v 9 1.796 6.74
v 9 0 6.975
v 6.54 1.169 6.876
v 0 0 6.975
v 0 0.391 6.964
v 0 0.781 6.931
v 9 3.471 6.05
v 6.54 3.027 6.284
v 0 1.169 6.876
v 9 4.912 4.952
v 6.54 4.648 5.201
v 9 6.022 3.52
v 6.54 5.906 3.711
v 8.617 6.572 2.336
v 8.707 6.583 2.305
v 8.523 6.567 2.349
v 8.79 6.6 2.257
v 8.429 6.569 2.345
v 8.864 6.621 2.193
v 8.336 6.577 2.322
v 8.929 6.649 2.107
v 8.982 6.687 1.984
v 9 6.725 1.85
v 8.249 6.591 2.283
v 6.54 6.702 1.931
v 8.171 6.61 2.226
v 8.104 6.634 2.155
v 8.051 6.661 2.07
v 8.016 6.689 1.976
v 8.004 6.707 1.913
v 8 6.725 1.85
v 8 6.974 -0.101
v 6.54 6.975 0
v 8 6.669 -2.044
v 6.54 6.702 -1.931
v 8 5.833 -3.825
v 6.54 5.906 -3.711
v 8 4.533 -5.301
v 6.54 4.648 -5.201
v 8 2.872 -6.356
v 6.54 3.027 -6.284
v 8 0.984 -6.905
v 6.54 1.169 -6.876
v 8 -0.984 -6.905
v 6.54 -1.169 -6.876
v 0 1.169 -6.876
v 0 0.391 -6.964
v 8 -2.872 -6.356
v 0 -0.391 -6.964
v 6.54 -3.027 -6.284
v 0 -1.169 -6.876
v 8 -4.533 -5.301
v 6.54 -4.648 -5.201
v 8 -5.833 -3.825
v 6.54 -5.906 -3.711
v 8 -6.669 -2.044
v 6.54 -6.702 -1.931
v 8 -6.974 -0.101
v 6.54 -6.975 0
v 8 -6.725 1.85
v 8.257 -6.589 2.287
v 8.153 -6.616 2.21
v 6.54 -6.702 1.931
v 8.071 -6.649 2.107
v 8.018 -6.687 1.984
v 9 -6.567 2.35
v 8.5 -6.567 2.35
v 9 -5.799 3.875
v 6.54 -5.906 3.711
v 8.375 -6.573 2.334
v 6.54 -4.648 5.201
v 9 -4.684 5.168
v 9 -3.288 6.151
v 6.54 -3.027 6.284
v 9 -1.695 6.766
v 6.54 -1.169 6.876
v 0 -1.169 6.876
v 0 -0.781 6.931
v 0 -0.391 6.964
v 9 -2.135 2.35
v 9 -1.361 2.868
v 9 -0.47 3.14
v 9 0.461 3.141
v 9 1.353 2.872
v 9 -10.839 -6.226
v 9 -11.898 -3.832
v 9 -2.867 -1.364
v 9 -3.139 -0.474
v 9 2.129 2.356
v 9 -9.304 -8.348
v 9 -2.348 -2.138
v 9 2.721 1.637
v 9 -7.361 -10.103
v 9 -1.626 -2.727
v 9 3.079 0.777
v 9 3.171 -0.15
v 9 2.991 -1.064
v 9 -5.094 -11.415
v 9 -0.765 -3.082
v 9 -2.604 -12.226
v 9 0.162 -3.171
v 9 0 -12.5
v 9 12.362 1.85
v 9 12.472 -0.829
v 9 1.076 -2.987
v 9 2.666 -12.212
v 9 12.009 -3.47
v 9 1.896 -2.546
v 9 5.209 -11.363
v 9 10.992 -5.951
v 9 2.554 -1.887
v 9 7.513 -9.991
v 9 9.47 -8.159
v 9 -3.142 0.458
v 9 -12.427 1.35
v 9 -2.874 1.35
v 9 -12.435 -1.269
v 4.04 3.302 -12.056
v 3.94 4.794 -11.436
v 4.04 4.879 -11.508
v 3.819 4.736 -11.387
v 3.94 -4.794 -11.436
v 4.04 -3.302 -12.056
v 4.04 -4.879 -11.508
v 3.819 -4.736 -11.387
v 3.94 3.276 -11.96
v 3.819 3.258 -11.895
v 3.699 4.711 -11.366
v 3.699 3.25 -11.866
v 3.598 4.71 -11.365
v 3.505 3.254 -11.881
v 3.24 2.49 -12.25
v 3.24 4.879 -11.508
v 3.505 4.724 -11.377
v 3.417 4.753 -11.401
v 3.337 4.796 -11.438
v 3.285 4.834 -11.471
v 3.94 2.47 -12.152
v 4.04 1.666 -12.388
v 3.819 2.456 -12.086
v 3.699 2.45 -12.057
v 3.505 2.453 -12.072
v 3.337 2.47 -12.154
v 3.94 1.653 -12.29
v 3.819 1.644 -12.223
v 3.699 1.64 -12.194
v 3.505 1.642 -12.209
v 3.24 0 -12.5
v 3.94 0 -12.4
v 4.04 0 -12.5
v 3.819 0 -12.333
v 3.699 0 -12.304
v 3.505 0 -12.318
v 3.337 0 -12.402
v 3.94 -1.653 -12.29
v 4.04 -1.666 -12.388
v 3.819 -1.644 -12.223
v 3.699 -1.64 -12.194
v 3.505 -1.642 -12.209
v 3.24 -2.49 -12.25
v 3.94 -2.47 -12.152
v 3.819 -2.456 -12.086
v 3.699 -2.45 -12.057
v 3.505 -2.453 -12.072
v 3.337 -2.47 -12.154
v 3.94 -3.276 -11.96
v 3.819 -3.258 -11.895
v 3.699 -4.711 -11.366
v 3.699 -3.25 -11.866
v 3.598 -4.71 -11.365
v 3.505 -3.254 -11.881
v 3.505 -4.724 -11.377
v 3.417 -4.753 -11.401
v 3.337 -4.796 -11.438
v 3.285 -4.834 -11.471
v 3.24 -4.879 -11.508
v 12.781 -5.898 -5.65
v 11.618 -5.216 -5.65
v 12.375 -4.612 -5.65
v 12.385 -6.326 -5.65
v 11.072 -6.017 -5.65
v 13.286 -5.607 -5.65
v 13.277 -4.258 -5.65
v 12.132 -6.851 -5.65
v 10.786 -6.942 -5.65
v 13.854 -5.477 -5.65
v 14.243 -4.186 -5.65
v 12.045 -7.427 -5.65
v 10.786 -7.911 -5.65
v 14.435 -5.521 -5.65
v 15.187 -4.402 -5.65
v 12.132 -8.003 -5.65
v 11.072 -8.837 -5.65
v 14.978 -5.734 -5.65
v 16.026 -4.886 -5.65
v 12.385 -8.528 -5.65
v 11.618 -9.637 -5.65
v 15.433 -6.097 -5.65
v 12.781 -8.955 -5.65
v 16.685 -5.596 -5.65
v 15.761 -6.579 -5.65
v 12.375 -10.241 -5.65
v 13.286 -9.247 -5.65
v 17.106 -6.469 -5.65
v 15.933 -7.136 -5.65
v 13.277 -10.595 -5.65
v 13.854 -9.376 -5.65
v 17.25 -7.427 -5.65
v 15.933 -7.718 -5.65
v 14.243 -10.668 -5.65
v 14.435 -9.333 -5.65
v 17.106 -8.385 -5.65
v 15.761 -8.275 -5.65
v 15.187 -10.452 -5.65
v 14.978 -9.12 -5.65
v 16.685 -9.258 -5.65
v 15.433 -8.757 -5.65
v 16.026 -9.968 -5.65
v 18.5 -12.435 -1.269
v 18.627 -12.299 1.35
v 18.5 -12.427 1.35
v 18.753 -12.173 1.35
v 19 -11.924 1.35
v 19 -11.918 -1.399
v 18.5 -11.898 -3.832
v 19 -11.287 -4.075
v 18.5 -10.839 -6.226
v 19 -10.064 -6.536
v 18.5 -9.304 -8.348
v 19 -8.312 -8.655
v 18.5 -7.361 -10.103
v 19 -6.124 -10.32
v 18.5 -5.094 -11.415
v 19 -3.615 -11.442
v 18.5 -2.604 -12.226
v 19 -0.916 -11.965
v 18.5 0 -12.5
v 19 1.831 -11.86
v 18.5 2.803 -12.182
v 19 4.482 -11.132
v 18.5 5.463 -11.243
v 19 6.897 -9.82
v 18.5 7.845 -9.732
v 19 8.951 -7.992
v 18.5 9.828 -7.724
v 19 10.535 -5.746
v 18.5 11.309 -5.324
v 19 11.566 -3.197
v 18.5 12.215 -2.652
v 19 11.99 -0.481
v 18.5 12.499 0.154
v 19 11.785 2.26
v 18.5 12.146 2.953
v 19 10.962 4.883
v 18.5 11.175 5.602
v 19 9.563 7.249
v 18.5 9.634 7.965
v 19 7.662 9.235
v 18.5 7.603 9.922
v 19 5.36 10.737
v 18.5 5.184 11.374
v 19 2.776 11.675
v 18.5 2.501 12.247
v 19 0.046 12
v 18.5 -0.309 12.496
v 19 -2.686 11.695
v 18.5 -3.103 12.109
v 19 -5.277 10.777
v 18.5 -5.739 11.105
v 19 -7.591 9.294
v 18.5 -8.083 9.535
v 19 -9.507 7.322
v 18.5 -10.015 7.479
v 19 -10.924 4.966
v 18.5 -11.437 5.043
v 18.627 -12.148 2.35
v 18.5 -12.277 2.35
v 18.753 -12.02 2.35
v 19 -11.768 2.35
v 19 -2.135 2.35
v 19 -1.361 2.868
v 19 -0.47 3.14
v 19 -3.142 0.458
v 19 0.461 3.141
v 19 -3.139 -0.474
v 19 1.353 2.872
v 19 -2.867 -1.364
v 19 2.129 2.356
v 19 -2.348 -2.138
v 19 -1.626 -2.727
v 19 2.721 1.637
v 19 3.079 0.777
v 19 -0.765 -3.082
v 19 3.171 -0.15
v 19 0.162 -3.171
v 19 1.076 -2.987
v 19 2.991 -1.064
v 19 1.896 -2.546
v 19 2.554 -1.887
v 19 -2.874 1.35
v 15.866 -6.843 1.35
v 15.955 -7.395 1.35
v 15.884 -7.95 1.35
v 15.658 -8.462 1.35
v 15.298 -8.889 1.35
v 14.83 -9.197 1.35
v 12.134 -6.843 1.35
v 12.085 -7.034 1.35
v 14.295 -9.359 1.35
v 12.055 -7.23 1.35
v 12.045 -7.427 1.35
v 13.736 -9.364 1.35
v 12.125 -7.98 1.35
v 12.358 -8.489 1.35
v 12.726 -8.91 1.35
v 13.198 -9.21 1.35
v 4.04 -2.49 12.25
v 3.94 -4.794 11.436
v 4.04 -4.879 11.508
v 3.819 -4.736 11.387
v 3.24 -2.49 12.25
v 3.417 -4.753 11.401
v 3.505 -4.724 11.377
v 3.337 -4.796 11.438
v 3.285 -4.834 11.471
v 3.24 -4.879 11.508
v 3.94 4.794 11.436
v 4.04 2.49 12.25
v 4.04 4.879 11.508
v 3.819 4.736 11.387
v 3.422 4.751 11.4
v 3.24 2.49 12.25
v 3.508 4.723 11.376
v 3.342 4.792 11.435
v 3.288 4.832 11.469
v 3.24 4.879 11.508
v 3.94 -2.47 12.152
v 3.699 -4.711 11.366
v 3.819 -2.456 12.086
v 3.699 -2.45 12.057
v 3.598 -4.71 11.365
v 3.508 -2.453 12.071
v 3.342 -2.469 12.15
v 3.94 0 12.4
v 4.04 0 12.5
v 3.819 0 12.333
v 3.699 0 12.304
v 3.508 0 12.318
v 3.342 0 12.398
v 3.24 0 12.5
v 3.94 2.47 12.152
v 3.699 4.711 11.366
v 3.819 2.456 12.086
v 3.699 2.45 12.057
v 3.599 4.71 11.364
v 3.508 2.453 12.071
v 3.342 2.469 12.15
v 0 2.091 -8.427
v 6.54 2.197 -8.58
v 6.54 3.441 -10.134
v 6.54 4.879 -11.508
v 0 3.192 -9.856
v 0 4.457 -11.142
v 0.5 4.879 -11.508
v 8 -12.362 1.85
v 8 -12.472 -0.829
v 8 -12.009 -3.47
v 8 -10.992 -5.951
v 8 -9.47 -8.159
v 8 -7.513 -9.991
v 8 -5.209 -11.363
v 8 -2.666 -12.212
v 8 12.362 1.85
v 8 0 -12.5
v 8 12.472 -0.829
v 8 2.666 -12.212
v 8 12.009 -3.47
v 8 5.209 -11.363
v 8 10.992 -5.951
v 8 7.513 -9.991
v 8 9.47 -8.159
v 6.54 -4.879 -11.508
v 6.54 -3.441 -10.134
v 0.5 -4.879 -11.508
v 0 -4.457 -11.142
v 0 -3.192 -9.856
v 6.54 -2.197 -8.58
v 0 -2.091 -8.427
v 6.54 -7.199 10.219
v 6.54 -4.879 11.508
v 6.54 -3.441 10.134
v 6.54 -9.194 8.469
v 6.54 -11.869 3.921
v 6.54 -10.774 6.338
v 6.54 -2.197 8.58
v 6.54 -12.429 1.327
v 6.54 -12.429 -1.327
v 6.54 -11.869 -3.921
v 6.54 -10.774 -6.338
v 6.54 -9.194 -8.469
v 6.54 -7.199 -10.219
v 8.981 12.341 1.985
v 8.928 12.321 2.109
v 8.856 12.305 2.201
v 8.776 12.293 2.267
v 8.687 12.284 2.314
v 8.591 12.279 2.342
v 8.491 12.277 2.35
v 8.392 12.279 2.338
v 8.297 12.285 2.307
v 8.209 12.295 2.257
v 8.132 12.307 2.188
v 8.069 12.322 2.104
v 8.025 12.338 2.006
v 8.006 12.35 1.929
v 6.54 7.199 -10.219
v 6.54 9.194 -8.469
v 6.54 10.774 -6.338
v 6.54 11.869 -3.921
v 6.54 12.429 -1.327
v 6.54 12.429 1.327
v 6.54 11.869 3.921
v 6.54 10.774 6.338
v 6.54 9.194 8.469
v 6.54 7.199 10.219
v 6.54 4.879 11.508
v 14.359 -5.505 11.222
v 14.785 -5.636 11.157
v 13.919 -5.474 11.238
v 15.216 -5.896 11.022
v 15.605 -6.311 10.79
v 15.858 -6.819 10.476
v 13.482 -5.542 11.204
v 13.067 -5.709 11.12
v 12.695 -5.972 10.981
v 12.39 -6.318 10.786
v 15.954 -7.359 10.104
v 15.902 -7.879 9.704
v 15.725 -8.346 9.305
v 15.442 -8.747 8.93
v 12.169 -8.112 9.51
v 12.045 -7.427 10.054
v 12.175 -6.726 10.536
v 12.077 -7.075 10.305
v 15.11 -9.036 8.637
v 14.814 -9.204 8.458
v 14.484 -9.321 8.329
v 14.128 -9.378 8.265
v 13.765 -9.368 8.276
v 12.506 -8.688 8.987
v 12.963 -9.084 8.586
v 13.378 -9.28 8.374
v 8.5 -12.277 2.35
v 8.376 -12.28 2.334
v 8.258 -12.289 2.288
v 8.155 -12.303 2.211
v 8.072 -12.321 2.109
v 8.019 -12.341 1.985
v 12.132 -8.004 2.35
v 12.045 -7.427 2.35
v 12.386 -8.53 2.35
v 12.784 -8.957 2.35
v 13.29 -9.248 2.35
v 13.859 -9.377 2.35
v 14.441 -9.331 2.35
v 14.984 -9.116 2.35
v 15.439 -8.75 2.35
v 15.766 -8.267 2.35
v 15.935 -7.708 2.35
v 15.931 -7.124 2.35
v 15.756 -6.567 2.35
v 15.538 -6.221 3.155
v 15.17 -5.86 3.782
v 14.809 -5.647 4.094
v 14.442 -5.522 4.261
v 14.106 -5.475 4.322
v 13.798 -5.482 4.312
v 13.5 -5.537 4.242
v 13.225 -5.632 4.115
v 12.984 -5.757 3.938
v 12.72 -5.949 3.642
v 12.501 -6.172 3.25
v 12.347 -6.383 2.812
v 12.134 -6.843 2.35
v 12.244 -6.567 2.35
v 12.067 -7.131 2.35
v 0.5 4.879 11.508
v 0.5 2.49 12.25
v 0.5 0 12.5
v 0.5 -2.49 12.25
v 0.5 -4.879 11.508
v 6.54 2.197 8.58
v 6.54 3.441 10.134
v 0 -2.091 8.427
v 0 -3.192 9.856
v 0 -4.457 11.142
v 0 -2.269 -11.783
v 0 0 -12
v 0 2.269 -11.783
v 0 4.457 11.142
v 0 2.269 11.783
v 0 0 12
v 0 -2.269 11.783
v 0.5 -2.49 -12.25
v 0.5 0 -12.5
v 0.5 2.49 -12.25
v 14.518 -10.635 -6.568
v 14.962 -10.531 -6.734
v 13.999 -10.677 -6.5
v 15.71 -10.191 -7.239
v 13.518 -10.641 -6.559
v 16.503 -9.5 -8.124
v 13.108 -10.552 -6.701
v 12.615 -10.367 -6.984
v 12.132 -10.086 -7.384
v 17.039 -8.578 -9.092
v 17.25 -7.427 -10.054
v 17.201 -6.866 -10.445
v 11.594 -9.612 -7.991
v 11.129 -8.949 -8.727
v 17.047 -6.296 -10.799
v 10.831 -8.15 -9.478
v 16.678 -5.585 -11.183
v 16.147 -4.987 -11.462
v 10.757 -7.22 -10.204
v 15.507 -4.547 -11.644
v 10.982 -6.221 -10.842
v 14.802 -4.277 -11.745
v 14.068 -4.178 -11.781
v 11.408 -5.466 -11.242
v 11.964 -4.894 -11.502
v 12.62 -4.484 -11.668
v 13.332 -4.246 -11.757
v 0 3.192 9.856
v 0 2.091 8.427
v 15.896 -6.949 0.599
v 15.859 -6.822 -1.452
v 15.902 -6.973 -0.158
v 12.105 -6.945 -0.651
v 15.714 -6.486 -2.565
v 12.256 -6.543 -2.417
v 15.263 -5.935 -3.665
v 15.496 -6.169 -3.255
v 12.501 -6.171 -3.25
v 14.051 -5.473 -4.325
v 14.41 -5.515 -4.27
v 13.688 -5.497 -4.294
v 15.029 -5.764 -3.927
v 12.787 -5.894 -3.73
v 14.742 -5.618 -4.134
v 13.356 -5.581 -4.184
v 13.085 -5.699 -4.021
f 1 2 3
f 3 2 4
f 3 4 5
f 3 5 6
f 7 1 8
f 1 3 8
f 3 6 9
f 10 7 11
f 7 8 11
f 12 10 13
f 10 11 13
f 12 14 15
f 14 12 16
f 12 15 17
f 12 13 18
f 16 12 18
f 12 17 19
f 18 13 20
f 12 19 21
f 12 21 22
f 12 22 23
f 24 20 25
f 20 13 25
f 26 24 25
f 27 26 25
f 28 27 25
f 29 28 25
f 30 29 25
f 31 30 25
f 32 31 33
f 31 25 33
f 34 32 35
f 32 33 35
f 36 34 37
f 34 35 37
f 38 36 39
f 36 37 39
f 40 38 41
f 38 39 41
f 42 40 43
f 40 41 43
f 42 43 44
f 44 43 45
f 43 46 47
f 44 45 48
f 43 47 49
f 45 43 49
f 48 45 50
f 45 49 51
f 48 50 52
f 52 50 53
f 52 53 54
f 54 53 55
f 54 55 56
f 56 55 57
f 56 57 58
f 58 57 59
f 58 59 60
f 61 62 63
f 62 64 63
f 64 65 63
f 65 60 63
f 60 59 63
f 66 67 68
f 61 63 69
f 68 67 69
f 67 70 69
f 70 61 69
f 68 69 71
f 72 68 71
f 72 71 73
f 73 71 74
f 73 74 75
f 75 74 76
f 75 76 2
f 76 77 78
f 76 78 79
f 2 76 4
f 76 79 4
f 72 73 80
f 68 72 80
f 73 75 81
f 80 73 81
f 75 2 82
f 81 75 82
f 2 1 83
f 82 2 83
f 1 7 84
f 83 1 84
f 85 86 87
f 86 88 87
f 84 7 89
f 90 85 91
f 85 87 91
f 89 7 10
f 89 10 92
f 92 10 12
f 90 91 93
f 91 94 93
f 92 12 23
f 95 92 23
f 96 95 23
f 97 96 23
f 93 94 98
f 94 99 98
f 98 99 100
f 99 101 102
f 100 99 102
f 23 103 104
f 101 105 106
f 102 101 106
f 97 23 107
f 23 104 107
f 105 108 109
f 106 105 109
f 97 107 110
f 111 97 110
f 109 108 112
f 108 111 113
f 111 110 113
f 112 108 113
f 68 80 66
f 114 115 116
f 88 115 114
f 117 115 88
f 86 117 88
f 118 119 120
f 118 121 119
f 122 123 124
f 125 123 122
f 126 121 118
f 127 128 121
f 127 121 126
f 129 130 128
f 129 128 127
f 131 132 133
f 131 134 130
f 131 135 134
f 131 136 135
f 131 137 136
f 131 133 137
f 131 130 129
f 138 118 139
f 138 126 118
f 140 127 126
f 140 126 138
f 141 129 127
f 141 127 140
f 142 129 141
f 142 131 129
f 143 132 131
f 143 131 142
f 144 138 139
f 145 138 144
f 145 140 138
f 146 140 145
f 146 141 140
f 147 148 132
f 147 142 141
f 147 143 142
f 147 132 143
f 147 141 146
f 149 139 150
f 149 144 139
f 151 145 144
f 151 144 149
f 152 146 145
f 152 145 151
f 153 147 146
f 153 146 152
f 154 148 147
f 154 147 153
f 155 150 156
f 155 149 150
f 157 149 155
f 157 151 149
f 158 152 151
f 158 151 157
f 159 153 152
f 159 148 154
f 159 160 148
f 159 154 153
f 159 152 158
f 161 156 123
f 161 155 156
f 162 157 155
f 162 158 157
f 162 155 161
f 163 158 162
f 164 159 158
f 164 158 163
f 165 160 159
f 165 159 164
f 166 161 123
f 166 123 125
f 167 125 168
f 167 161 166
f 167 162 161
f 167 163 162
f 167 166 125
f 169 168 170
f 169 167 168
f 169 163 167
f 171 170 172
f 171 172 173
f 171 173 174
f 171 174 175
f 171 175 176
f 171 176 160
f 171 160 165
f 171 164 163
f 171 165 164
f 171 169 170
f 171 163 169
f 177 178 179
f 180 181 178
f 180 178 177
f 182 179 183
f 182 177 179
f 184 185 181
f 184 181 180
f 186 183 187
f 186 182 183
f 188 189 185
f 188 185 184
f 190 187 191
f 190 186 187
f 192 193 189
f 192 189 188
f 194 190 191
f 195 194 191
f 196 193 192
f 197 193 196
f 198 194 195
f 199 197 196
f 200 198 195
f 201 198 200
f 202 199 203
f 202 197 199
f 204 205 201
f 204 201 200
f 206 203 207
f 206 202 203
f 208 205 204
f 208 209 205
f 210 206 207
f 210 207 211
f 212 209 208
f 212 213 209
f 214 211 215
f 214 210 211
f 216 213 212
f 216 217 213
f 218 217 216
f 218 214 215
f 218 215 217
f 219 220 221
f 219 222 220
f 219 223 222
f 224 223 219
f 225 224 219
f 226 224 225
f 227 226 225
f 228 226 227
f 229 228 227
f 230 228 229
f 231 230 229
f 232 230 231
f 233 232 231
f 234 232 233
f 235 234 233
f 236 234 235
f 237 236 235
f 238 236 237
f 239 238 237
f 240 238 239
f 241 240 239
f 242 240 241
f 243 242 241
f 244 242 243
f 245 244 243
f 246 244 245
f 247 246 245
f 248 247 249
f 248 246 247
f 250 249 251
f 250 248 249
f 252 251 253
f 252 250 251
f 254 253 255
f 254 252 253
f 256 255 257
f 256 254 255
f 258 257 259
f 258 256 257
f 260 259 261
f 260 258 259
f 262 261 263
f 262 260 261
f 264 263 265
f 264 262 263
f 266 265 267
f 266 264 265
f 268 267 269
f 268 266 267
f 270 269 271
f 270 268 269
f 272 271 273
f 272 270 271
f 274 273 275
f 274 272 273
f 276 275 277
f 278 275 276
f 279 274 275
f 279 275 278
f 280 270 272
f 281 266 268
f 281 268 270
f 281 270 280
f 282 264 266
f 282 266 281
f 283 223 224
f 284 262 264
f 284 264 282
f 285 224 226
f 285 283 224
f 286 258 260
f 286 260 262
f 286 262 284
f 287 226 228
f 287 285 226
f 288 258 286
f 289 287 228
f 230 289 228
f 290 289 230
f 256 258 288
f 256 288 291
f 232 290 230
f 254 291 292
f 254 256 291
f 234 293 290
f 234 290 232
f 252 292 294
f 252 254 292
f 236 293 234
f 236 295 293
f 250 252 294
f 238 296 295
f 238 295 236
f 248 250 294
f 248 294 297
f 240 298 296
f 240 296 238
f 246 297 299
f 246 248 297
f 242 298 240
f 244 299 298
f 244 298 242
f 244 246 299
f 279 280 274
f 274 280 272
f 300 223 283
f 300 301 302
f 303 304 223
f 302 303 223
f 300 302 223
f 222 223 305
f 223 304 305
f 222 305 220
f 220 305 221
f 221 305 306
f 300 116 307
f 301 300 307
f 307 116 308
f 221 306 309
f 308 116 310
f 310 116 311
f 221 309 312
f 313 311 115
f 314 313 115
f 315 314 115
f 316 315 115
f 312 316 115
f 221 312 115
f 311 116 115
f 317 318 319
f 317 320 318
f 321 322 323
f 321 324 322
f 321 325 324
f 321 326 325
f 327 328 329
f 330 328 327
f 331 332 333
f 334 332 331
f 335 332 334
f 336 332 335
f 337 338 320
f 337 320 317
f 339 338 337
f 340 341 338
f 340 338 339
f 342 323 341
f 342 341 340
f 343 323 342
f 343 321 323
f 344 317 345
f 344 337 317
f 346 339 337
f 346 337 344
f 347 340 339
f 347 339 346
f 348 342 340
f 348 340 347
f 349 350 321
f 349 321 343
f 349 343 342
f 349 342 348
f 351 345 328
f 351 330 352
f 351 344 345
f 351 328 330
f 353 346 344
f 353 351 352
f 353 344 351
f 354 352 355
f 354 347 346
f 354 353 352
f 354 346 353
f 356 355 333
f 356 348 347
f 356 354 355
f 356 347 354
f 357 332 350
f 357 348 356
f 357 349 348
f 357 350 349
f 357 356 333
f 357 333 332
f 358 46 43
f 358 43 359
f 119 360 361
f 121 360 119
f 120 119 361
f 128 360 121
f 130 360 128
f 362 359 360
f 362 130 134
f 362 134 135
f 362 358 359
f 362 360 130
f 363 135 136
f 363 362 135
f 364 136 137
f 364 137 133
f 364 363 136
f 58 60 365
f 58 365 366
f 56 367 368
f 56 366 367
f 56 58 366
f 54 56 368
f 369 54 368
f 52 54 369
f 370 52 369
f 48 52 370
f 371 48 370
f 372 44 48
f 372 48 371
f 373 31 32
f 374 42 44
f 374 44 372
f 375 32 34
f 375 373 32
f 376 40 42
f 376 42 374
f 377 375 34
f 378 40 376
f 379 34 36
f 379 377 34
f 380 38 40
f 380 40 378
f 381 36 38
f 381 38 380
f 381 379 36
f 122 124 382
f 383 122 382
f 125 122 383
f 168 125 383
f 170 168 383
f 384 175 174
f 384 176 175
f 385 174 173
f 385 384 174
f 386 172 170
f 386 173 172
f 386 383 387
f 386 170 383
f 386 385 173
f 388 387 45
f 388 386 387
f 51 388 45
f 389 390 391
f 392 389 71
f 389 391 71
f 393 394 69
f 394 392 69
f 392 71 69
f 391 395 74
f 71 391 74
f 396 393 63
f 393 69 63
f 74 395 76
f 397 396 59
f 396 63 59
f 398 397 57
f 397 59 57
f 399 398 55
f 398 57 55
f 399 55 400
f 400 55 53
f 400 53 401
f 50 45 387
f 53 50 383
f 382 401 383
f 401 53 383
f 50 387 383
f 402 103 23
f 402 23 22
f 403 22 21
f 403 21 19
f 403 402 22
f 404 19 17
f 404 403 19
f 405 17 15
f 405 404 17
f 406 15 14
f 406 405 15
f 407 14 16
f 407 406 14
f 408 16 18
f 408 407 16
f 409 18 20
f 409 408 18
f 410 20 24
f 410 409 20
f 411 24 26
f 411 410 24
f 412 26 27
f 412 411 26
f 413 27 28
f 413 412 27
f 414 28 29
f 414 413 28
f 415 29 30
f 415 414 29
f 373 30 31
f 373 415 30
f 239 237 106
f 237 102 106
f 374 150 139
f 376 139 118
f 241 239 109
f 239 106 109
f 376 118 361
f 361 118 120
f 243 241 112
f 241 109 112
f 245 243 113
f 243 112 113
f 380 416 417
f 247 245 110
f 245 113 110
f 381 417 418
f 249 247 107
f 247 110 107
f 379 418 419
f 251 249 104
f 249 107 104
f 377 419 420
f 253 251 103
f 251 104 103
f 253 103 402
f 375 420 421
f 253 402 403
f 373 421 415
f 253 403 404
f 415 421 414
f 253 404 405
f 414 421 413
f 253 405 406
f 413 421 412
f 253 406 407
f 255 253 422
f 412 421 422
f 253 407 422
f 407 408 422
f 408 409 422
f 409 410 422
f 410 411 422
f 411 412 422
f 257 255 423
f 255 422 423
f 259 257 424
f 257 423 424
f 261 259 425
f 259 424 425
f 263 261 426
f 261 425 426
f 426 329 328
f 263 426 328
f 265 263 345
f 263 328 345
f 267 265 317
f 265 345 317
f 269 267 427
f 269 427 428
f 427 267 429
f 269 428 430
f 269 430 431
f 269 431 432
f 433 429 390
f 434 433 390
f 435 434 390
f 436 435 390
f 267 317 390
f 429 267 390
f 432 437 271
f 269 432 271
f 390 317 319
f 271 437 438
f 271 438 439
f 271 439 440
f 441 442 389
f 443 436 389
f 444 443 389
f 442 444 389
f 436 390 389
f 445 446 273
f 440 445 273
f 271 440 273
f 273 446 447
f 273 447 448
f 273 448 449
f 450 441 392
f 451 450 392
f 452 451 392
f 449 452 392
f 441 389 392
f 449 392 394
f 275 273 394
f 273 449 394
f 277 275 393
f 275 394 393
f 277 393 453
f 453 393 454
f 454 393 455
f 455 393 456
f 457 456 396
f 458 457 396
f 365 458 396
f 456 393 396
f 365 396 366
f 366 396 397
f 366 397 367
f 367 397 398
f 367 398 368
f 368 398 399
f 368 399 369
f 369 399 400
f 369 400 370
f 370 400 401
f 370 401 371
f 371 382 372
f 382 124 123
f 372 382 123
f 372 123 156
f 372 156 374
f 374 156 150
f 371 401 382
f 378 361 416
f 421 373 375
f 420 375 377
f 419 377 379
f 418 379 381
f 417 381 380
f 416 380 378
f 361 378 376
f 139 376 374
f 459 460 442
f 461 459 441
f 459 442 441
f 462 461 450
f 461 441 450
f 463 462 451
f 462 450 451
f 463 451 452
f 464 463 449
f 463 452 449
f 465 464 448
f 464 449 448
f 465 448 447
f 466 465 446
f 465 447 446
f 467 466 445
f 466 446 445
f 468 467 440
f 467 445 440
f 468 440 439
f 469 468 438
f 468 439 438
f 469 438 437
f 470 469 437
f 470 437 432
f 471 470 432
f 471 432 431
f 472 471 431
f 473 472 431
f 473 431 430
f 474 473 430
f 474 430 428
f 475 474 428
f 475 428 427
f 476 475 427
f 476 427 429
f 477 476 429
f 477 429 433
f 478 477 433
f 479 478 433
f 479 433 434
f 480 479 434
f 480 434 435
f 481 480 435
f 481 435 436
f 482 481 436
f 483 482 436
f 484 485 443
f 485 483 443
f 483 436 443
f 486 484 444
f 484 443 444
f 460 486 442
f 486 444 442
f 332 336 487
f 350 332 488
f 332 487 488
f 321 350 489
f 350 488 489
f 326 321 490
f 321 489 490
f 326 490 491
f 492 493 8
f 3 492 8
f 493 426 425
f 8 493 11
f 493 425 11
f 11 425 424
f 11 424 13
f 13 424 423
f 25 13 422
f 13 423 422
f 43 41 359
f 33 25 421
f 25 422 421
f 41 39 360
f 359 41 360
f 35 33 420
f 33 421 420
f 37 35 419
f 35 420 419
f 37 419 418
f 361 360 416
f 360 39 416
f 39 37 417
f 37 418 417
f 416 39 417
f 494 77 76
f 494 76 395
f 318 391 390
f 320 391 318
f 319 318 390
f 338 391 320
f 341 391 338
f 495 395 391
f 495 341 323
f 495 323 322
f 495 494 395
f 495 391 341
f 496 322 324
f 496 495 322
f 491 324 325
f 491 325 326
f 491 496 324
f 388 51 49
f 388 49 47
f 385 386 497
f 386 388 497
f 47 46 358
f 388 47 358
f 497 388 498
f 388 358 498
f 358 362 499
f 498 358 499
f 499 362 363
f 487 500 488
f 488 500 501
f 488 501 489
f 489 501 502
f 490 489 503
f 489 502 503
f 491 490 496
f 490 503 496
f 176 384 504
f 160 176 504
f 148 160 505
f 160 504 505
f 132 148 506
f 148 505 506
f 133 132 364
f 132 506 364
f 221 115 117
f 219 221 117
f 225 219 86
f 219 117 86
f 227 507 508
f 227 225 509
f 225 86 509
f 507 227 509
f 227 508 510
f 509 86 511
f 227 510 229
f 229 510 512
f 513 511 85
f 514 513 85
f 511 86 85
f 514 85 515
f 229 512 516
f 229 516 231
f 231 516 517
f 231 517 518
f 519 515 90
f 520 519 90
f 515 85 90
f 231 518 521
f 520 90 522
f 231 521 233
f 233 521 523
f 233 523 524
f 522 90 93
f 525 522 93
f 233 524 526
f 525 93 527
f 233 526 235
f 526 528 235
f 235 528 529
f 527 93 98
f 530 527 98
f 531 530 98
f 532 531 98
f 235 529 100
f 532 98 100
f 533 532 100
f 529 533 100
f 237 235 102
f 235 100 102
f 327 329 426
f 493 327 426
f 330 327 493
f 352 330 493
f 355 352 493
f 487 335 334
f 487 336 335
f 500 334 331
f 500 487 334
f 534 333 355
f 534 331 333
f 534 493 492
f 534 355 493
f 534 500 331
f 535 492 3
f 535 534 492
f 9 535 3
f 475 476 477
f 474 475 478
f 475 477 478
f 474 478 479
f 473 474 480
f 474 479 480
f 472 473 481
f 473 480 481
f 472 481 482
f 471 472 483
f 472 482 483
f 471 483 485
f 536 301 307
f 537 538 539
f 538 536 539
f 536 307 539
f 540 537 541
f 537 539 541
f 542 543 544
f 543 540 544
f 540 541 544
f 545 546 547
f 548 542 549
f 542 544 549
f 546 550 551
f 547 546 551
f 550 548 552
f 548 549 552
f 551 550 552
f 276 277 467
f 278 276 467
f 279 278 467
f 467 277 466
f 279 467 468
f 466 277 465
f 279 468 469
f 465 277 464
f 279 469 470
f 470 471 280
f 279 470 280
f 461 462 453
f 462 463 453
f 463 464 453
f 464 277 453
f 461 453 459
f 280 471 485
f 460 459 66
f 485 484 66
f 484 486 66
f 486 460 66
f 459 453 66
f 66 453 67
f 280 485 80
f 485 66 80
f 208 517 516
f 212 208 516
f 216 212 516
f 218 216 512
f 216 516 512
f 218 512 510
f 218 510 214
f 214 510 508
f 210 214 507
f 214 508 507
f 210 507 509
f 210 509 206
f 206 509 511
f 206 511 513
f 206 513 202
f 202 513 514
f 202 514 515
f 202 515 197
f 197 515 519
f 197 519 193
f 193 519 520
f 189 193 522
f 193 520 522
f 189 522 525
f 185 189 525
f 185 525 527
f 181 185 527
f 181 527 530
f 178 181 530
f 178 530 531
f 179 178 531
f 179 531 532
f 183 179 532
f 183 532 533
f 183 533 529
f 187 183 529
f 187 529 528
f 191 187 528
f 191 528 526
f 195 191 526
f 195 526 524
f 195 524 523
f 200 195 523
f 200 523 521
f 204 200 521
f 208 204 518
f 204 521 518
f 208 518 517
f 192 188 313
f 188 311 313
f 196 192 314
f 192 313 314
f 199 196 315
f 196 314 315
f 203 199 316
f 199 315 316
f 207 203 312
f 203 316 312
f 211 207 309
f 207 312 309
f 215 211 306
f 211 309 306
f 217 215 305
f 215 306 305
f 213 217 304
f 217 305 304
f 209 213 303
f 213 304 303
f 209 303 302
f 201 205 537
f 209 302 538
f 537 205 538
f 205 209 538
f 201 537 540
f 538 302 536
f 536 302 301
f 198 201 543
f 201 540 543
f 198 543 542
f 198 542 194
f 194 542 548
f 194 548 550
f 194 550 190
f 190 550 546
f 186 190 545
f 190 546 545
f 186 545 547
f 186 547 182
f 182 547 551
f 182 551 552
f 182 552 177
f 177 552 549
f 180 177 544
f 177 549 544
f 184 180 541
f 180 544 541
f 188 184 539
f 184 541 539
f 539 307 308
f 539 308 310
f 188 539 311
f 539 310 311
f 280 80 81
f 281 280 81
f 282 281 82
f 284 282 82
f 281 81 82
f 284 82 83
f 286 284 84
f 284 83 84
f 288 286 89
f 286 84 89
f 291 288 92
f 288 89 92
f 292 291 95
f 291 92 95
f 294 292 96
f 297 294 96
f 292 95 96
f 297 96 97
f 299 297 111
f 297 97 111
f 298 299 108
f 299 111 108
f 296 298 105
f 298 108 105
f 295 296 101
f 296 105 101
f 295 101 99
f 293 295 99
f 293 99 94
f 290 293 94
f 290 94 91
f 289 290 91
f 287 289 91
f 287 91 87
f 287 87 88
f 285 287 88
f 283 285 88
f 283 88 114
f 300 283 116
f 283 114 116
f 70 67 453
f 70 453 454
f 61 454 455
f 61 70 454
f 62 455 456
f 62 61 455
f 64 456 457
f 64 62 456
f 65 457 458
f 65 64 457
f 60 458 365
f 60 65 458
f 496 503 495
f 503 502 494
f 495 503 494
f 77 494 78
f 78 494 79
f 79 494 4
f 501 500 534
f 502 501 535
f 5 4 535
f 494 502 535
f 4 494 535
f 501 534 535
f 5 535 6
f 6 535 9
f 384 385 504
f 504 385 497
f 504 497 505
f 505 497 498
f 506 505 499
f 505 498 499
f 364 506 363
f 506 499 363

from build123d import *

# Parameters (mm, degrees)
SKETCH1_R                                            = 12.5
BOSS_EXTRUDE1_DEPTH                                  = 19
CUT_EXTRUDE1_REACH                                   = 27.952
SKETCH3_R                                            = 6.975
CUT_EXTRUDE2_DEPTH                                   = 6.54
SKETCH5_R                                            = 0.5
CUT_EXTRUDE4_DEPTH                                   = 17.5
CUT_EXTRUDE5_DEPTH                                   = 15
REFRENTADO_PARA_TORNILLO_TAP_N_CON_CABEZ_D           = 3.91
REFRENTADO_PARA_TORNILLO_TAP_N_CON_CABEZ_CBORE_D     = 6.5
REFRENTADO_PARA_TORNILLO_TAP_N_CON_CABEZ_CBORE_DEPTH = 8
CHAFL_N1_SIZE                                        = 0.5
DODANIE_WYCI_GNI_CIE1_START                          = -10
DODANIE_WYCI_GNI_CIE1_DEPTH                          = 10


with BuildPart() as part:
    # Sketch1 → Boss-Extrude1 (new body)
    with BuildSketch(Plane(origin=(0, 0, 0), x_dir=(0, 0, -1), z_dir=(1, 0, 0))):
        Circle(SKETCH1_R)
    extrude(amount=BOSS_EXTRUDE1_DEPTH)

    # Sketch3 → Cut-Extrude1 (cut, up to next)
    with BuildSketch(Plane.ZY, mode=Mode.PRIVATE) as cut_extrude1_sk1:
        Circle(SKETCH3_R)
    cut_extrude1_tool1 = extrude(cut_extrude1_sk1.sketch, amount=-CUT_EXTRUDE1_REACH, mode=Mode.PRIVATE) & part.part
    add(cut_extrude1_tool1.solids().sort_by_distance((0, 0, 0))[0], mode=Mode.SUBTRACT)

    # Sketch2 → Cut-Extrude2 (cut)
    with BuildSketch(Plane.ZY):
        with BuildLine():
            Line((6.876343086, 1.168987069), (6.876343086, -1.168987069))
            ThreePointArc((6.876343086, -1.168987069), (0, -29.5), (-6.876343086, -1.168987069))
            Line((-6.876343086, -1.168987069), (-6.876343086, 1.168987069))
            ThreePointArc((-6.876343086, 1.168987069), (0, 29.5), (6.876343086, 1.168987069))
        make_face()
    extrude(amount=-CUT_EXTRUDE2_DEPTH, mode=Mode.SUBTRACT)

    # Sketch5 → Cut-Revolve1 (revolve, cut)
    with BuildSketch(Plane(origin=(0, 0, 0), x_dir=(-1, 0, 0), z_dir=(0, -1, 0)), mode=Mode.PRIVATE) as cut_revolve1_sk:
        with Locations((-3.64, 12.8)):
            Circle(SKETCH5_R)
    revolve(cut_revolve1_sk.sketch.rotate(Axis((19, 0, 0), (-1, 0, 0)), 202.975957279), axis=Axis((19, 0, 0), (-1, 0, 0)), mode=Mode.SUBTRACT)

    # Sketch6 → Cut-Extrude4 (cut, symmetric)
    with BuildSketch(Plane(origin=(0, 0, 0), x_dir=(1, 0, 0), z_dir=(0, 1, 0))):
        with BuildLine():
            Line((9, 14.85), (9, -1.85))
            ThreePointArc((9, -1.85), (8.5, -2.35), (8, -1.85))
            Line((8, -1.85), (8, 14.85))
            Line((8, 14.85), (9, 14.85))
        make_face()
    extrude(amount=CUT_EXTRUDE4_DEPTH, both=True, mode=Mode.SUBTRACT)

    # Sketch9 → Cut-Extrude5 (cut)
    with BuildSketch(Plane(origin=(0, 0, 0), x_dir=(1, 0, 0), z_dir=(0, 1, 0))):
        with BuildLine():
            Line((8.5, -1.35), (27.798520731, -1.35))
            ThreePointArc((27.798520731, -1.35), (28.298520731, -1.85), (27.798520731, -2.35))
            Line((27.798520731, -2.35), (8.5, -2.35))
            ThreePointArc((8.5, -2.35), (8, -1.85), (8.5, -1.35))
        make_face()
    extrude(amount=-CUT_EXTRUDE5_DEPTH, mode=Mode.SUBTRACT)

    # Refrentado para tornillo tapón con cabeza de clavija de M2.51 (through all)
    with Locations(Plane(origin=(0, 0, -13.65), x_dir=(1, 0, 0), z_dir=(0, 0, -1))):
        with Locations((14, 7.426886175)):
            CounterBoreHole(REFRENTADO_PARA_TORNILLO_TAP_N_CON_CABEZ_D / 2, REFRENTADO_PARA_TORNILLO_TAP_N_CON_CABEZ_CBORE_D / 2, REFRENTADO_PARA_TORNILLO_TAP_N_CON_CABEZ_CBORE_DEPTH)

    # Chaflán1
    chafl_n1_edges = [part.edges().sort_by_distance(p)[0] for p in [
        (0, 0, 12.5),
        (0, 0, -12.5),
        (19, 9.633924434, 7.964766161),
    ]]
    chamfer(chafl_n1_edges, length=CHAFL_N1_SIZE)

    # Szkic1 → Dodanie-wyciągnięcie1 (add)
    with BuildSketch(Plane(origin=(19, 0, 0), x_dir=(0, 0, -1), z_dir=(1, 0, 0)).offset(DODANIE_WYCI_GNI_CIE1_START)):
        with BuildLine():
            Line((-2.35, -6.567200697), (-2.35, -2.134976581))
            ThreePointArc((-2.35, -2.134976581), (1.88651169, 2.553761665), (-1.35, -2.873695356))
            Line((-1.35, -2.873695356), (-1.35, -6.843107847))
            ThreePointArc((-1.35, -6.843107847), (1.855136434, 6.723770803), (-2.35, -6.567200697))
        make_face()
    extrude(amount=DODANIE_WYCI_GNI_CIE1_DEPTH)


solid = part.part
